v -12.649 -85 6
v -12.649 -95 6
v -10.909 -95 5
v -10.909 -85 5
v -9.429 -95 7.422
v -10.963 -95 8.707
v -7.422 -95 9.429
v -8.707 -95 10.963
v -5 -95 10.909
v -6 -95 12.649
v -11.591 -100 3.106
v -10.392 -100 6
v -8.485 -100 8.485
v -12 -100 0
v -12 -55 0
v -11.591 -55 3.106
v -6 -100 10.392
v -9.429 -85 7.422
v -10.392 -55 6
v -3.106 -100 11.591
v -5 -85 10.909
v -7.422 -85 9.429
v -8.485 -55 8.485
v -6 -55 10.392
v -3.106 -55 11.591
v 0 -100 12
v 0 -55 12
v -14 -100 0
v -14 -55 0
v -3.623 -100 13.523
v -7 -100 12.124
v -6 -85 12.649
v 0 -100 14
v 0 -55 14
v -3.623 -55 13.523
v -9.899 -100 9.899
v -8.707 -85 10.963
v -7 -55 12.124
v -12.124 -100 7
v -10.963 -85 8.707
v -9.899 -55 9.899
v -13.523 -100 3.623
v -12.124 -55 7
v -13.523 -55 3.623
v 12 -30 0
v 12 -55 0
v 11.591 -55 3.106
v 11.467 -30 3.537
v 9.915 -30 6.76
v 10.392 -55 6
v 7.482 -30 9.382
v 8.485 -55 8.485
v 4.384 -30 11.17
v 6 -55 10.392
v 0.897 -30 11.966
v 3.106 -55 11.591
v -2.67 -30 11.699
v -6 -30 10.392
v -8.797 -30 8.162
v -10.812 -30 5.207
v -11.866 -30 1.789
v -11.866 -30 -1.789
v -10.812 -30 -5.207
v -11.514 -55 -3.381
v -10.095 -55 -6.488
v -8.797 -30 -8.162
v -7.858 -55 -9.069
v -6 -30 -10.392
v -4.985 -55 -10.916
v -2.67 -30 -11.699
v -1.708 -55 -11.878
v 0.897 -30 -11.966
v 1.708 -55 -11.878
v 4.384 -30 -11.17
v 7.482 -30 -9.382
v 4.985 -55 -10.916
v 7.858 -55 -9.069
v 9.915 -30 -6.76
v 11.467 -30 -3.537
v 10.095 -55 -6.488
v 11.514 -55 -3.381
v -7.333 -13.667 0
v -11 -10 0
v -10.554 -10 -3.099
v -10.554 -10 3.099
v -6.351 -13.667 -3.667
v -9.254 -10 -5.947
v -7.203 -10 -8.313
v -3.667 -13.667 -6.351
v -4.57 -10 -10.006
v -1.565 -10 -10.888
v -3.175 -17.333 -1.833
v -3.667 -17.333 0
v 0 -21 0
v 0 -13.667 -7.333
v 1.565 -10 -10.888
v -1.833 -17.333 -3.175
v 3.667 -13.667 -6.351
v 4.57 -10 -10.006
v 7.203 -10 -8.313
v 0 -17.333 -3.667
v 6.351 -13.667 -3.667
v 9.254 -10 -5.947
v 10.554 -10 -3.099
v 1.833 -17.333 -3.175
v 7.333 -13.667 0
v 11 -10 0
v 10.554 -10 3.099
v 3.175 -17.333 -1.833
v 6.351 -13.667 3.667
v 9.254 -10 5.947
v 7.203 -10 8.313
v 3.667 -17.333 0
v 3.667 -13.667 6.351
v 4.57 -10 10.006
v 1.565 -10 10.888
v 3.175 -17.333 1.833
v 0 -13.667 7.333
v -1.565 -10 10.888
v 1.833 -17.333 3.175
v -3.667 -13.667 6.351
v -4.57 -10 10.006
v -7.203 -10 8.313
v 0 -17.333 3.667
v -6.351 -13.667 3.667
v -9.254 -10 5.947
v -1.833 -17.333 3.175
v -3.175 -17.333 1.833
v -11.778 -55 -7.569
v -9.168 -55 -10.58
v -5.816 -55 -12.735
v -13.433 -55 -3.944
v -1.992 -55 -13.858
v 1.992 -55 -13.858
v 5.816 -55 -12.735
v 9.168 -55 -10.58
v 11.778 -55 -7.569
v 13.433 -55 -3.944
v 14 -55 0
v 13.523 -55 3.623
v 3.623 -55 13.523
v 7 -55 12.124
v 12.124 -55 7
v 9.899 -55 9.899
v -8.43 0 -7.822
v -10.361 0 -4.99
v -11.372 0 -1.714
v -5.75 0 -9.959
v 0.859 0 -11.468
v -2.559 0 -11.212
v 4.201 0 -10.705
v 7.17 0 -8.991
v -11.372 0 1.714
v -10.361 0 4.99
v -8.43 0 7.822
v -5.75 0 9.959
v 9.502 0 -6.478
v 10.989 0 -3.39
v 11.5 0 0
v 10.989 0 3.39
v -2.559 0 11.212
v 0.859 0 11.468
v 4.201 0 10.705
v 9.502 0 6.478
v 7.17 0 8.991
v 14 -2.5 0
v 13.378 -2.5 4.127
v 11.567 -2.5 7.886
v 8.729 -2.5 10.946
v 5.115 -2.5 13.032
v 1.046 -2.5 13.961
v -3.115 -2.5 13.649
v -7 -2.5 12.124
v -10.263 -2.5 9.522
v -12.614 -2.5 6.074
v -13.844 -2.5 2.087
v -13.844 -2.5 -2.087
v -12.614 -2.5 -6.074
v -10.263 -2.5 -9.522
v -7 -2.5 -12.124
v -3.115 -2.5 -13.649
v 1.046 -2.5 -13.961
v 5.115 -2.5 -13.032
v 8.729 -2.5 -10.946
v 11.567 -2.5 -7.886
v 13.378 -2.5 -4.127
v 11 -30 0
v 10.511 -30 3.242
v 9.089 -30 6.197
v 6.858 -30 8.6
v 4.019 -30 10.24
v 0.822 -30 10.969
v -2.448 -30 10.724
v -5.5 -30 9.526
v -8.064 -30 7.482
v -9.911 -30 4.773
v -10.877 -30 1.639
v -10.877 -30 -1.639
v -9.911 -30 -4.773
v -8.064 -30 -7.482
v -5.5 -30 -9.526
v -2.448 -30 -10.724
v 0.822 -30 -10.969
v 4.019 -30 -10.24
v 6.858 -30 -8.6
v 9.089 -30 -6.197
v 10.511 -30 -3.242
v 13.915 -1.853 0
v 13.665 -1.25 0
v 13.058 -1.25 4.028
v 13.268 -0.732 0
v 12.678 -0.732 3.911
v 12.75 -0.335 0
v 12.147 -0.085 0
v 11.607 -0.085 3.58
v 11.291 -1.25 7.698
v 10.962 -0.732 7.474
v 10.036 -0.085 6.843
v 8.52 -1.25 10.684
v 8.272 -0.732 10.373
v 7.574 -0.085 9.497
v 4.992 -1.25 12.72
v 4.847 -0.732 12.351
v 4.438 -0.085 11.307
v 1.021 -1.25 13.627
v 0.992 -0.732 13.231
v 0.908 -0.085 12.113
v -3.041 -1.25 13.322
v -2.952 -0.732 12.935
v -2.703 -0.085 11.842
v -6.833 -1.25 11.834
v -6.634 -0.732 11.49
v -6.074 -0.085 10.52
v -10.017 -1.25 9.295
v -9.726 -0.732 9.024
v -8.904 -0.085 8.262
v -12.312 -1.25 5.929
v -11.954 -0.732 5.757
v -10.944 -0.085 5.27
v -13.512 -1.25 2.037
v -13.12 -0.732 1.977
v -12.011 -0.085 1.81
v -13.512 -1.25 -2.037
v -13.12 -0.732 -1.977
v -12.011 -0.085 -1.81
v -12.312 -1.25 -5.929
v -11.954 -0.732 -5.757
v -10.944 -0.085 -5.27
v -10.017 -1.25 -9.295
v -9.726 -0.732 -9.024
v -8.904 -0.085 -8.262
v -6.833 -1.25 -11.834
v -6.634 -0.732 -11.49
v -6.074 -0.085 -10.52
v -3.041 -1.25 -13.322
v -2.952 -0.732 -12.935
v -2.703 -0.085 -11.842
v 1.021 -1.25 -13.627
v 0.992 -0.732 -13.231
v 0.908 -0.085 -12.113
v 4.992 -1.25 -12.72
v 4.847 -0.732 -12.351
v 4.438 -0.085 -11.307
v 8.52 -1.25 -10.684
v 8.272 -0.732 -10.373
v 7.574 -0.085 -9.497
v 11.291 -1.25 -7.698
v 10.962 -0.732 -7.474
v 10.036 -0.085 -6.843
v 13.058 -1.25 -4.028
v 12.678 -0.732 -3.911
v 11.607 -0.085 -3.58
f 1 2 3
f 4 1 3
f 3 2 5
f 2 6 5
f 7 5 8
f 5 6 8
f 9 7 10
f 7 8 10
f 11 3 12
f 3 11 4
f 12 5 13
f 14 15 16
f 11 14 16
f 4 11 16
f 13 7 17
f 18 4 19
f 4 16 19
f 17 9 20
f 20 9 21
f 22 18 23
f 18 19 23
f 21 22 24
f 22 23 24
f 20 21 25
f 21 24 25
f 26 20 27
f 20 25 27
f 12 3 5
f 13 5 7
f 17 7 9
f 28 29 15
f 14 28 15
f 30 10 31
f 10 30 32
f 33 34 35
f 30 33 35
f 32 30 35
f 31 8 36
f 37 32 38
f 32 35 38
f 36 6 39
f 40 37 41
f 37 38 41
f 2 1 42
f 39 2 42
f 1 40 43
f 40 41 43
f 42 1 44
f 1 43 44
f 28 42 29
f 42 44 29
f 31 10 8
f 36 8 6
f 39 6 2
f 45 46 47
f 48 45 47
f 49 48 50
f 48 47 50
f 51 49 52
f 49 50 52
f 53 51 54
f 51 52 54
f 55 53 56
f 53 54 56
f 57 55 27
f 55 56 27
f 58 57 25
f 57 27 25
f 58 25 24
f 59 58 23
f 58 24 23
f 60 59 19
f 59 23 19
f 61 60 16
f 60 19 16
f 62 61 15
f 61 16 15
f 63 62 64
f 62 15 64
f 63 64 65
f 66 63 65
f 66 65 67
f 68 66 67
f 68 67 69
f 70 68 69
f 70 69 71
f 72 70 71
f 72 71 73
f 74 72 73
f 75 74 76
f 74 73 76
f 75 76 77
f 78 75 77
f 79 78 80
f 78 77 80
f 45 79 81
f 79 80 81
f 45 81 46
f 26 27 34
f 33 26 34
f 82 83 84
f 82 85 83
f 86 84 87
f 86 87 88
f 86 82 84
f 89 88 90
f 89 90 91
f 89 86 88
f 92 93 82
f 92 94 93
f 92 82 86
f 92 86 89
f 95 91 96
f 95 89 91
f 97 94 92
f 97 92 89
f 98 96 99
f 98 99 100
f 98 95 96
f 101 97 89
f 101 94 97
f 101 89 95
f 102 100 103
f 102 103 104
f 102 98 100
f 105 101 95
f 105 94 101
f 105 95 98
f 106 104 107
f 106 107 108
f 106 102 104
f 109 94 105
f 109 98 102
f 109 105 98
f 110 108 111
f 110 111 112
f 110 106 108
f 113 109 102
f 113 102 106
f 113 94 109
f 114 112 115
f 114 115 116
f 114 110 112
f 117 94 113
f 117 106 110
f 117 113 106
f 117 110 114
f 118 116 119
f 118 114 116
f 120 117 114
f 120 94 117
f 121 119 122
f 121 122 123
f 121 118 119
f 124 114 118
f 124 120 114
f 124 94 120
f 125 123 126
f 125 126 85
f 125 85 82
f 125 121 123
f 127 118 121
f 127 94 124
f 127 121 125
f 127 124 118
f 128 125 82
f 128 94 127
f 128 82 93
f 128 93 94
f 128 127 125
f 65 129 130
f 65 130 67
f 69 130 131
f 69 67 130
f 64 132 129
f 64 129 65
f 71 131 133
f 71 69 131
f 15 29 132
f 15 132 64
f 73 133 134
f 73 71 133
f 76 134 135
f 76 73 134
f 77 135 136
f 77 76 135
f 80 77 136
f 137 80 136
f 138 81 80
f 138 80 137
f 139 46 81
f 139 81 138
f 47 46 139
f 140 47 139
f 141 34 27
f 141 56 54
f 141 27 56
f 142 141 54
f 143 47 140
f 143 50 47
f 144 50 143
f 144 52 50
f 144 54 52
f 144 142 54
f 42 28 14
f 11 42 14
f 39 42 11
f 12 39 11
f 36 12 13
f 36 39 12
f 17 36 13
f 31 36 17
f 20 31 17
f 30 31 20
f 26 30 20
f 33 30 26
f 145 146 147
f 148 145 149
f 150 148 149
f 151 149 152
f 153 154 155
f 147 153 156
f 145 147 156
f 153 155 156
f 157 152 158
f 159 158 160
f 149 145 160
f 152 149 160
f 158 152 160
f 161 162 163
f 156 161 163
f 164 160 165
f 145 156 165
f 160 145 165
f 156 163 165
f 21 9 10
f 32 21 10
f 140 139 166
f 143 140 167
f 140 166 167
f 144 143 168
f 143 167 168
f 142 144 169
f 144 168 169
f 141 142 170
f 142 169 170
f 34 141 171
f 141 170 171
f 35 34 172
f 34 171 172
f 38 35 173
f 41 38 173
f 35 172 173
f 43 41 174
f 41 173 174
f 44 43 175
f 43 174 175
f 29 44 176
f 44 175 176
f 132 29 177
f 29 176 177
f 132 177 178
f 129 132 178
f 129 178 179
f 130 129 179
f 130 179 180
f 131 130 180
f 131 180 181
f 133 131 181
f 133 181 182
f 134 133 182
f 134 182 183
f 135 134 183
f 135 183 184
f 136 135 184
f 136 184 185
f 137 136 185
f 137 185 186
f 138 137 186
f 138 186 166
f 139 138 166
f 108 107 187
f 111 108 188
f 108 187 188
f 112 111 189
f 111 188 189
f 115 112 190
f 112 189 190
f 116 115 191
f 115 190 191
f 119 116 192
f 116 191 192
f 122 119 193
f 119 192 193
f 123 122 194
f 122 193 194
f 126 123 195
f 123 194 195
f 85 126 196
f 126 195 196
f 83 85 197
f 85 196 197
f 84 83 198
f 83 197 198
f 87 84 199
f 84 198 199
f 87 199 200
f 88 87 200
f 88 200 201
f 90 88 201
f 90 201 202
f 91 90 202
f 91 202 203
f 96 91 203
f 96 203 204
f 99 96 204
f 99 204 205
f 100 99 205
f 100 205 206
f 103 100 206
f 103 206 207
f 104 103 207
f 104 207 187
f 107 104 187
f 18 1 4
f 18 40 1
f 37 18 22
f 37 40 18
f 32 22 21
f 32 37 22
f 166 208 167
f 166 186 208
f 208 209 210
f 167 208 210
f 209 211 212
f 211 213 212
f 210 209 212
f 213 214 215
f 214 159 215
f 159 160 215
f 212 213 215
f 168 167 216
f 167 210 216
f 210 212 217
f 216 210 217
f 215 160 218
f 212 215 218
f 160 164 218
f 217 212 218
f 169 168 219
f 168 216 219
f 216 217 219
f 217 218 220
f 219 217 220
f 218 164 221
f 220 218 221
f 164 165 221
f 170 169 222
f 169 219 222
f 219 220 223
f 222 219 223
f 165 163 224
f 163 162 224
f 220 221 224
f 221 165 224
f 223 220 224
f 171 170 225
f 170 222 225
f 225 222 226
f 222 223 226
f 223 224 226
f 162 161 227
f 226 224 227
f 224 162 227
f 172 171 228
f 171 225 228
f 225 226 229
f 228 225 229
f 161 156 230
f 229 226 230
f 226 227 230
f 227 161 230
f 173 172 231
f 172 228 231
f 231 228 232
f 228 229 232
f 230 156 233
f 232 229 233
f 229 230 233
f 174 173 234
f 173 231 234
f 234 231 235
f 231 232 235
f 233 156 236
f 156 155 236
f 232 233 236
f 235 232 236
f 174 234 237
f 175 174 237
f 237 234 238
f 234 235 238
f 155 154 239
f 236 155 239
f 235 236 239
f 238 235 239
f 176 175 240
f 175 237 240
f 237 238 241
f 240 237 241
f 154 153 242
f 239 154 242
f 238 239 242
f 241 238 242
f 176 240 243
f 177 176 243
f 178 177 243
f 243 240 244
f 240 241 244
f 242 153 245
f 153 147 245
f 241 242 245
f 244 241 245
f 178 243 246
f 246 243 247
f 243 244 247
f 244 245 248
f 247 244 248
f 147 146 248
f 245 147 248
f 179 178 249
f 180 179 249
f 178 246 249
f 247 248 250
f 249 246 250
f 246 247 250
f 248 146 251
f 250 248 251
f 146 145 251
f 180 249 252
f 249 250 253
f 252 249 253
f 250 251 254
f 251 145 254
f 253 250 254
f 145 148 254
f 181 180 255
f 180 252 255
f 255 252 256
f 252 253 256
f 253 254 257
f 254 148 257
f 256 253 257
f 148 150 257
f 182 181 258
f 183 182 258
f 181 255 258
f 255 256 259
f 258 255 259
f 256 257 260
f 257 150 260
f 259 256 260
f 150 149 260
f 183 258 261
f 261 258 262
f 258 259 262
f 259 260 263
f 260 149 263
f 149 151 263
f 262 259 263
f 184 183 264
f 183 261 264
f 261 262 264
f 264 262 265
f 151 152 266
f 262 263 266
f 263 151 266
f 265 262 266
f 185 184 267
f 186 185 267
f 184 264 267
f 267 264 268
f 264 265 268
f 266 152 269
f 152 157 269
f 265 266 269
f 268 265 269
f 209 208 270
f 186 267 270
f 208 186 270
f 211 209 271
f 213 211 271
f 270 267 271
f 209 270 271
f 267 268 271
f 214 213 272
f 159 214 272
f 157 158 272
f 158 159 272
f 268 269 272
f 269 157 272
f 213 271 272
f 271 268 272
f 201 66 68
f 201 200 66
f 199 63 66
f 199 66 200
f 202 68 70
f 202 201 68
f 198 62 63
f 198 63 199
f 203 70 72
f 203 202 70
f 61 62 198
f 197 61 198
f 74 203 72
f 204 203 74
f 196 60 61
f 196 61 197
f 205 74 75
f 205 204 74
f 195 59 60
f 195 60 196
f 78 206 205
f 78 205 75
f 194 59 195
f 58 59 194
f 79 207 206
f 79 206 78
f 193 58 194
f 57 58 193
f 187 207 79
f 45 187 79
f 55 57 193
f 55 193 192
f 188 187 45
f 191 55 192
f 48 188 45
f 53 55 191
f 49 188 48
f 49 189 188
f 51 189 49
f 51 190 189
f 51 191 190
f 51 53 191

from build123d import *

# Parameters (mm, degrees)
F0_R      = 14
F1_DEPTH  = 55
F2_R      = 12
F3_DEPTH  = 25
F4_R      = 11
F5_DEPTH  = 20
F6_R      = 2.5
F10_DEPTH = 45
F12_START = -5
F12_DEPTH = 10


with BuildPart() as f1:
    # F0 (on Front) → F1 (new body)
    with BuildSketch(Plane.XZ):
        Circle(F0_R)
    extrude(amount=F1_DEPTH)

    # F2 (on face) → F3 (cut)
    with BuildSketch(Plane.XZ.offset(55)):
        Circle(F2_R)
    extrude(amount=-F3_DEPTH, mode=Mode.SUBTRACT)

    # F4 (on face) → F5 (cut)
    with BuildSketch(Plane.XZ.offset(30)):
        Circle(F4_R)
    extrude(amount=-F5_DEPTH, mode=Mode.SUBTRACT)

    # F6
    f6_edges = [f1.edges().sort_by_distance(p)[0] for p in [
        (-14, 0, 0),
    ]]
    fillet(f6_edges, radius=F6_R)

    # F7 (on Top) → F8 (revolve)
    with BuildSketch(Plane.XY):
        Polygon((0, -21), (0, -10), (-11, -10), align=None)
    revolve(axis=Axis((0, -15.5, 0), (0, -1, 0)))

    # F9 (on face) → F10 (join)
    with BuildSketch(Plane.XZ.offset(55)):
        with BuildLine():
            Line((-14, 0), (-12, 0))
            ThreePointArc((-12, 0), (-8.4852813742, 8.4852813742), (0, 12))
            Line((0, 12), (0, 14))
            ThreePointArc((0, 14), (-9.8994949366, 9.8994949366), (-14, 0))
        make_face()
    extrude(amount=F10_DEPTH)

    # F11 (on face) → F12 (cut)
    with BuildSketch(Plane.XZ.offset(100).offset(F12_START)):
        with BuildLine():
            Line((-12.6491106407, 6), (-10.9087121146, 5))
            ThreePointArc((-10.9087121146, 5), (-8.4852813742, 8.4852813742), (-5, 10.9087121146))
            Line((-5, 10.9087121146), (-6, 12.6491106407))
            ThreePointArc((-6, 12.6491106407), (-9.8994949366, 9.8994949366), (-12.6491106407, 6))
        make_face()
    extrude(amount=-F12_DEPTH, mode=Mode.SUBTRACT)


solid = f1.part
